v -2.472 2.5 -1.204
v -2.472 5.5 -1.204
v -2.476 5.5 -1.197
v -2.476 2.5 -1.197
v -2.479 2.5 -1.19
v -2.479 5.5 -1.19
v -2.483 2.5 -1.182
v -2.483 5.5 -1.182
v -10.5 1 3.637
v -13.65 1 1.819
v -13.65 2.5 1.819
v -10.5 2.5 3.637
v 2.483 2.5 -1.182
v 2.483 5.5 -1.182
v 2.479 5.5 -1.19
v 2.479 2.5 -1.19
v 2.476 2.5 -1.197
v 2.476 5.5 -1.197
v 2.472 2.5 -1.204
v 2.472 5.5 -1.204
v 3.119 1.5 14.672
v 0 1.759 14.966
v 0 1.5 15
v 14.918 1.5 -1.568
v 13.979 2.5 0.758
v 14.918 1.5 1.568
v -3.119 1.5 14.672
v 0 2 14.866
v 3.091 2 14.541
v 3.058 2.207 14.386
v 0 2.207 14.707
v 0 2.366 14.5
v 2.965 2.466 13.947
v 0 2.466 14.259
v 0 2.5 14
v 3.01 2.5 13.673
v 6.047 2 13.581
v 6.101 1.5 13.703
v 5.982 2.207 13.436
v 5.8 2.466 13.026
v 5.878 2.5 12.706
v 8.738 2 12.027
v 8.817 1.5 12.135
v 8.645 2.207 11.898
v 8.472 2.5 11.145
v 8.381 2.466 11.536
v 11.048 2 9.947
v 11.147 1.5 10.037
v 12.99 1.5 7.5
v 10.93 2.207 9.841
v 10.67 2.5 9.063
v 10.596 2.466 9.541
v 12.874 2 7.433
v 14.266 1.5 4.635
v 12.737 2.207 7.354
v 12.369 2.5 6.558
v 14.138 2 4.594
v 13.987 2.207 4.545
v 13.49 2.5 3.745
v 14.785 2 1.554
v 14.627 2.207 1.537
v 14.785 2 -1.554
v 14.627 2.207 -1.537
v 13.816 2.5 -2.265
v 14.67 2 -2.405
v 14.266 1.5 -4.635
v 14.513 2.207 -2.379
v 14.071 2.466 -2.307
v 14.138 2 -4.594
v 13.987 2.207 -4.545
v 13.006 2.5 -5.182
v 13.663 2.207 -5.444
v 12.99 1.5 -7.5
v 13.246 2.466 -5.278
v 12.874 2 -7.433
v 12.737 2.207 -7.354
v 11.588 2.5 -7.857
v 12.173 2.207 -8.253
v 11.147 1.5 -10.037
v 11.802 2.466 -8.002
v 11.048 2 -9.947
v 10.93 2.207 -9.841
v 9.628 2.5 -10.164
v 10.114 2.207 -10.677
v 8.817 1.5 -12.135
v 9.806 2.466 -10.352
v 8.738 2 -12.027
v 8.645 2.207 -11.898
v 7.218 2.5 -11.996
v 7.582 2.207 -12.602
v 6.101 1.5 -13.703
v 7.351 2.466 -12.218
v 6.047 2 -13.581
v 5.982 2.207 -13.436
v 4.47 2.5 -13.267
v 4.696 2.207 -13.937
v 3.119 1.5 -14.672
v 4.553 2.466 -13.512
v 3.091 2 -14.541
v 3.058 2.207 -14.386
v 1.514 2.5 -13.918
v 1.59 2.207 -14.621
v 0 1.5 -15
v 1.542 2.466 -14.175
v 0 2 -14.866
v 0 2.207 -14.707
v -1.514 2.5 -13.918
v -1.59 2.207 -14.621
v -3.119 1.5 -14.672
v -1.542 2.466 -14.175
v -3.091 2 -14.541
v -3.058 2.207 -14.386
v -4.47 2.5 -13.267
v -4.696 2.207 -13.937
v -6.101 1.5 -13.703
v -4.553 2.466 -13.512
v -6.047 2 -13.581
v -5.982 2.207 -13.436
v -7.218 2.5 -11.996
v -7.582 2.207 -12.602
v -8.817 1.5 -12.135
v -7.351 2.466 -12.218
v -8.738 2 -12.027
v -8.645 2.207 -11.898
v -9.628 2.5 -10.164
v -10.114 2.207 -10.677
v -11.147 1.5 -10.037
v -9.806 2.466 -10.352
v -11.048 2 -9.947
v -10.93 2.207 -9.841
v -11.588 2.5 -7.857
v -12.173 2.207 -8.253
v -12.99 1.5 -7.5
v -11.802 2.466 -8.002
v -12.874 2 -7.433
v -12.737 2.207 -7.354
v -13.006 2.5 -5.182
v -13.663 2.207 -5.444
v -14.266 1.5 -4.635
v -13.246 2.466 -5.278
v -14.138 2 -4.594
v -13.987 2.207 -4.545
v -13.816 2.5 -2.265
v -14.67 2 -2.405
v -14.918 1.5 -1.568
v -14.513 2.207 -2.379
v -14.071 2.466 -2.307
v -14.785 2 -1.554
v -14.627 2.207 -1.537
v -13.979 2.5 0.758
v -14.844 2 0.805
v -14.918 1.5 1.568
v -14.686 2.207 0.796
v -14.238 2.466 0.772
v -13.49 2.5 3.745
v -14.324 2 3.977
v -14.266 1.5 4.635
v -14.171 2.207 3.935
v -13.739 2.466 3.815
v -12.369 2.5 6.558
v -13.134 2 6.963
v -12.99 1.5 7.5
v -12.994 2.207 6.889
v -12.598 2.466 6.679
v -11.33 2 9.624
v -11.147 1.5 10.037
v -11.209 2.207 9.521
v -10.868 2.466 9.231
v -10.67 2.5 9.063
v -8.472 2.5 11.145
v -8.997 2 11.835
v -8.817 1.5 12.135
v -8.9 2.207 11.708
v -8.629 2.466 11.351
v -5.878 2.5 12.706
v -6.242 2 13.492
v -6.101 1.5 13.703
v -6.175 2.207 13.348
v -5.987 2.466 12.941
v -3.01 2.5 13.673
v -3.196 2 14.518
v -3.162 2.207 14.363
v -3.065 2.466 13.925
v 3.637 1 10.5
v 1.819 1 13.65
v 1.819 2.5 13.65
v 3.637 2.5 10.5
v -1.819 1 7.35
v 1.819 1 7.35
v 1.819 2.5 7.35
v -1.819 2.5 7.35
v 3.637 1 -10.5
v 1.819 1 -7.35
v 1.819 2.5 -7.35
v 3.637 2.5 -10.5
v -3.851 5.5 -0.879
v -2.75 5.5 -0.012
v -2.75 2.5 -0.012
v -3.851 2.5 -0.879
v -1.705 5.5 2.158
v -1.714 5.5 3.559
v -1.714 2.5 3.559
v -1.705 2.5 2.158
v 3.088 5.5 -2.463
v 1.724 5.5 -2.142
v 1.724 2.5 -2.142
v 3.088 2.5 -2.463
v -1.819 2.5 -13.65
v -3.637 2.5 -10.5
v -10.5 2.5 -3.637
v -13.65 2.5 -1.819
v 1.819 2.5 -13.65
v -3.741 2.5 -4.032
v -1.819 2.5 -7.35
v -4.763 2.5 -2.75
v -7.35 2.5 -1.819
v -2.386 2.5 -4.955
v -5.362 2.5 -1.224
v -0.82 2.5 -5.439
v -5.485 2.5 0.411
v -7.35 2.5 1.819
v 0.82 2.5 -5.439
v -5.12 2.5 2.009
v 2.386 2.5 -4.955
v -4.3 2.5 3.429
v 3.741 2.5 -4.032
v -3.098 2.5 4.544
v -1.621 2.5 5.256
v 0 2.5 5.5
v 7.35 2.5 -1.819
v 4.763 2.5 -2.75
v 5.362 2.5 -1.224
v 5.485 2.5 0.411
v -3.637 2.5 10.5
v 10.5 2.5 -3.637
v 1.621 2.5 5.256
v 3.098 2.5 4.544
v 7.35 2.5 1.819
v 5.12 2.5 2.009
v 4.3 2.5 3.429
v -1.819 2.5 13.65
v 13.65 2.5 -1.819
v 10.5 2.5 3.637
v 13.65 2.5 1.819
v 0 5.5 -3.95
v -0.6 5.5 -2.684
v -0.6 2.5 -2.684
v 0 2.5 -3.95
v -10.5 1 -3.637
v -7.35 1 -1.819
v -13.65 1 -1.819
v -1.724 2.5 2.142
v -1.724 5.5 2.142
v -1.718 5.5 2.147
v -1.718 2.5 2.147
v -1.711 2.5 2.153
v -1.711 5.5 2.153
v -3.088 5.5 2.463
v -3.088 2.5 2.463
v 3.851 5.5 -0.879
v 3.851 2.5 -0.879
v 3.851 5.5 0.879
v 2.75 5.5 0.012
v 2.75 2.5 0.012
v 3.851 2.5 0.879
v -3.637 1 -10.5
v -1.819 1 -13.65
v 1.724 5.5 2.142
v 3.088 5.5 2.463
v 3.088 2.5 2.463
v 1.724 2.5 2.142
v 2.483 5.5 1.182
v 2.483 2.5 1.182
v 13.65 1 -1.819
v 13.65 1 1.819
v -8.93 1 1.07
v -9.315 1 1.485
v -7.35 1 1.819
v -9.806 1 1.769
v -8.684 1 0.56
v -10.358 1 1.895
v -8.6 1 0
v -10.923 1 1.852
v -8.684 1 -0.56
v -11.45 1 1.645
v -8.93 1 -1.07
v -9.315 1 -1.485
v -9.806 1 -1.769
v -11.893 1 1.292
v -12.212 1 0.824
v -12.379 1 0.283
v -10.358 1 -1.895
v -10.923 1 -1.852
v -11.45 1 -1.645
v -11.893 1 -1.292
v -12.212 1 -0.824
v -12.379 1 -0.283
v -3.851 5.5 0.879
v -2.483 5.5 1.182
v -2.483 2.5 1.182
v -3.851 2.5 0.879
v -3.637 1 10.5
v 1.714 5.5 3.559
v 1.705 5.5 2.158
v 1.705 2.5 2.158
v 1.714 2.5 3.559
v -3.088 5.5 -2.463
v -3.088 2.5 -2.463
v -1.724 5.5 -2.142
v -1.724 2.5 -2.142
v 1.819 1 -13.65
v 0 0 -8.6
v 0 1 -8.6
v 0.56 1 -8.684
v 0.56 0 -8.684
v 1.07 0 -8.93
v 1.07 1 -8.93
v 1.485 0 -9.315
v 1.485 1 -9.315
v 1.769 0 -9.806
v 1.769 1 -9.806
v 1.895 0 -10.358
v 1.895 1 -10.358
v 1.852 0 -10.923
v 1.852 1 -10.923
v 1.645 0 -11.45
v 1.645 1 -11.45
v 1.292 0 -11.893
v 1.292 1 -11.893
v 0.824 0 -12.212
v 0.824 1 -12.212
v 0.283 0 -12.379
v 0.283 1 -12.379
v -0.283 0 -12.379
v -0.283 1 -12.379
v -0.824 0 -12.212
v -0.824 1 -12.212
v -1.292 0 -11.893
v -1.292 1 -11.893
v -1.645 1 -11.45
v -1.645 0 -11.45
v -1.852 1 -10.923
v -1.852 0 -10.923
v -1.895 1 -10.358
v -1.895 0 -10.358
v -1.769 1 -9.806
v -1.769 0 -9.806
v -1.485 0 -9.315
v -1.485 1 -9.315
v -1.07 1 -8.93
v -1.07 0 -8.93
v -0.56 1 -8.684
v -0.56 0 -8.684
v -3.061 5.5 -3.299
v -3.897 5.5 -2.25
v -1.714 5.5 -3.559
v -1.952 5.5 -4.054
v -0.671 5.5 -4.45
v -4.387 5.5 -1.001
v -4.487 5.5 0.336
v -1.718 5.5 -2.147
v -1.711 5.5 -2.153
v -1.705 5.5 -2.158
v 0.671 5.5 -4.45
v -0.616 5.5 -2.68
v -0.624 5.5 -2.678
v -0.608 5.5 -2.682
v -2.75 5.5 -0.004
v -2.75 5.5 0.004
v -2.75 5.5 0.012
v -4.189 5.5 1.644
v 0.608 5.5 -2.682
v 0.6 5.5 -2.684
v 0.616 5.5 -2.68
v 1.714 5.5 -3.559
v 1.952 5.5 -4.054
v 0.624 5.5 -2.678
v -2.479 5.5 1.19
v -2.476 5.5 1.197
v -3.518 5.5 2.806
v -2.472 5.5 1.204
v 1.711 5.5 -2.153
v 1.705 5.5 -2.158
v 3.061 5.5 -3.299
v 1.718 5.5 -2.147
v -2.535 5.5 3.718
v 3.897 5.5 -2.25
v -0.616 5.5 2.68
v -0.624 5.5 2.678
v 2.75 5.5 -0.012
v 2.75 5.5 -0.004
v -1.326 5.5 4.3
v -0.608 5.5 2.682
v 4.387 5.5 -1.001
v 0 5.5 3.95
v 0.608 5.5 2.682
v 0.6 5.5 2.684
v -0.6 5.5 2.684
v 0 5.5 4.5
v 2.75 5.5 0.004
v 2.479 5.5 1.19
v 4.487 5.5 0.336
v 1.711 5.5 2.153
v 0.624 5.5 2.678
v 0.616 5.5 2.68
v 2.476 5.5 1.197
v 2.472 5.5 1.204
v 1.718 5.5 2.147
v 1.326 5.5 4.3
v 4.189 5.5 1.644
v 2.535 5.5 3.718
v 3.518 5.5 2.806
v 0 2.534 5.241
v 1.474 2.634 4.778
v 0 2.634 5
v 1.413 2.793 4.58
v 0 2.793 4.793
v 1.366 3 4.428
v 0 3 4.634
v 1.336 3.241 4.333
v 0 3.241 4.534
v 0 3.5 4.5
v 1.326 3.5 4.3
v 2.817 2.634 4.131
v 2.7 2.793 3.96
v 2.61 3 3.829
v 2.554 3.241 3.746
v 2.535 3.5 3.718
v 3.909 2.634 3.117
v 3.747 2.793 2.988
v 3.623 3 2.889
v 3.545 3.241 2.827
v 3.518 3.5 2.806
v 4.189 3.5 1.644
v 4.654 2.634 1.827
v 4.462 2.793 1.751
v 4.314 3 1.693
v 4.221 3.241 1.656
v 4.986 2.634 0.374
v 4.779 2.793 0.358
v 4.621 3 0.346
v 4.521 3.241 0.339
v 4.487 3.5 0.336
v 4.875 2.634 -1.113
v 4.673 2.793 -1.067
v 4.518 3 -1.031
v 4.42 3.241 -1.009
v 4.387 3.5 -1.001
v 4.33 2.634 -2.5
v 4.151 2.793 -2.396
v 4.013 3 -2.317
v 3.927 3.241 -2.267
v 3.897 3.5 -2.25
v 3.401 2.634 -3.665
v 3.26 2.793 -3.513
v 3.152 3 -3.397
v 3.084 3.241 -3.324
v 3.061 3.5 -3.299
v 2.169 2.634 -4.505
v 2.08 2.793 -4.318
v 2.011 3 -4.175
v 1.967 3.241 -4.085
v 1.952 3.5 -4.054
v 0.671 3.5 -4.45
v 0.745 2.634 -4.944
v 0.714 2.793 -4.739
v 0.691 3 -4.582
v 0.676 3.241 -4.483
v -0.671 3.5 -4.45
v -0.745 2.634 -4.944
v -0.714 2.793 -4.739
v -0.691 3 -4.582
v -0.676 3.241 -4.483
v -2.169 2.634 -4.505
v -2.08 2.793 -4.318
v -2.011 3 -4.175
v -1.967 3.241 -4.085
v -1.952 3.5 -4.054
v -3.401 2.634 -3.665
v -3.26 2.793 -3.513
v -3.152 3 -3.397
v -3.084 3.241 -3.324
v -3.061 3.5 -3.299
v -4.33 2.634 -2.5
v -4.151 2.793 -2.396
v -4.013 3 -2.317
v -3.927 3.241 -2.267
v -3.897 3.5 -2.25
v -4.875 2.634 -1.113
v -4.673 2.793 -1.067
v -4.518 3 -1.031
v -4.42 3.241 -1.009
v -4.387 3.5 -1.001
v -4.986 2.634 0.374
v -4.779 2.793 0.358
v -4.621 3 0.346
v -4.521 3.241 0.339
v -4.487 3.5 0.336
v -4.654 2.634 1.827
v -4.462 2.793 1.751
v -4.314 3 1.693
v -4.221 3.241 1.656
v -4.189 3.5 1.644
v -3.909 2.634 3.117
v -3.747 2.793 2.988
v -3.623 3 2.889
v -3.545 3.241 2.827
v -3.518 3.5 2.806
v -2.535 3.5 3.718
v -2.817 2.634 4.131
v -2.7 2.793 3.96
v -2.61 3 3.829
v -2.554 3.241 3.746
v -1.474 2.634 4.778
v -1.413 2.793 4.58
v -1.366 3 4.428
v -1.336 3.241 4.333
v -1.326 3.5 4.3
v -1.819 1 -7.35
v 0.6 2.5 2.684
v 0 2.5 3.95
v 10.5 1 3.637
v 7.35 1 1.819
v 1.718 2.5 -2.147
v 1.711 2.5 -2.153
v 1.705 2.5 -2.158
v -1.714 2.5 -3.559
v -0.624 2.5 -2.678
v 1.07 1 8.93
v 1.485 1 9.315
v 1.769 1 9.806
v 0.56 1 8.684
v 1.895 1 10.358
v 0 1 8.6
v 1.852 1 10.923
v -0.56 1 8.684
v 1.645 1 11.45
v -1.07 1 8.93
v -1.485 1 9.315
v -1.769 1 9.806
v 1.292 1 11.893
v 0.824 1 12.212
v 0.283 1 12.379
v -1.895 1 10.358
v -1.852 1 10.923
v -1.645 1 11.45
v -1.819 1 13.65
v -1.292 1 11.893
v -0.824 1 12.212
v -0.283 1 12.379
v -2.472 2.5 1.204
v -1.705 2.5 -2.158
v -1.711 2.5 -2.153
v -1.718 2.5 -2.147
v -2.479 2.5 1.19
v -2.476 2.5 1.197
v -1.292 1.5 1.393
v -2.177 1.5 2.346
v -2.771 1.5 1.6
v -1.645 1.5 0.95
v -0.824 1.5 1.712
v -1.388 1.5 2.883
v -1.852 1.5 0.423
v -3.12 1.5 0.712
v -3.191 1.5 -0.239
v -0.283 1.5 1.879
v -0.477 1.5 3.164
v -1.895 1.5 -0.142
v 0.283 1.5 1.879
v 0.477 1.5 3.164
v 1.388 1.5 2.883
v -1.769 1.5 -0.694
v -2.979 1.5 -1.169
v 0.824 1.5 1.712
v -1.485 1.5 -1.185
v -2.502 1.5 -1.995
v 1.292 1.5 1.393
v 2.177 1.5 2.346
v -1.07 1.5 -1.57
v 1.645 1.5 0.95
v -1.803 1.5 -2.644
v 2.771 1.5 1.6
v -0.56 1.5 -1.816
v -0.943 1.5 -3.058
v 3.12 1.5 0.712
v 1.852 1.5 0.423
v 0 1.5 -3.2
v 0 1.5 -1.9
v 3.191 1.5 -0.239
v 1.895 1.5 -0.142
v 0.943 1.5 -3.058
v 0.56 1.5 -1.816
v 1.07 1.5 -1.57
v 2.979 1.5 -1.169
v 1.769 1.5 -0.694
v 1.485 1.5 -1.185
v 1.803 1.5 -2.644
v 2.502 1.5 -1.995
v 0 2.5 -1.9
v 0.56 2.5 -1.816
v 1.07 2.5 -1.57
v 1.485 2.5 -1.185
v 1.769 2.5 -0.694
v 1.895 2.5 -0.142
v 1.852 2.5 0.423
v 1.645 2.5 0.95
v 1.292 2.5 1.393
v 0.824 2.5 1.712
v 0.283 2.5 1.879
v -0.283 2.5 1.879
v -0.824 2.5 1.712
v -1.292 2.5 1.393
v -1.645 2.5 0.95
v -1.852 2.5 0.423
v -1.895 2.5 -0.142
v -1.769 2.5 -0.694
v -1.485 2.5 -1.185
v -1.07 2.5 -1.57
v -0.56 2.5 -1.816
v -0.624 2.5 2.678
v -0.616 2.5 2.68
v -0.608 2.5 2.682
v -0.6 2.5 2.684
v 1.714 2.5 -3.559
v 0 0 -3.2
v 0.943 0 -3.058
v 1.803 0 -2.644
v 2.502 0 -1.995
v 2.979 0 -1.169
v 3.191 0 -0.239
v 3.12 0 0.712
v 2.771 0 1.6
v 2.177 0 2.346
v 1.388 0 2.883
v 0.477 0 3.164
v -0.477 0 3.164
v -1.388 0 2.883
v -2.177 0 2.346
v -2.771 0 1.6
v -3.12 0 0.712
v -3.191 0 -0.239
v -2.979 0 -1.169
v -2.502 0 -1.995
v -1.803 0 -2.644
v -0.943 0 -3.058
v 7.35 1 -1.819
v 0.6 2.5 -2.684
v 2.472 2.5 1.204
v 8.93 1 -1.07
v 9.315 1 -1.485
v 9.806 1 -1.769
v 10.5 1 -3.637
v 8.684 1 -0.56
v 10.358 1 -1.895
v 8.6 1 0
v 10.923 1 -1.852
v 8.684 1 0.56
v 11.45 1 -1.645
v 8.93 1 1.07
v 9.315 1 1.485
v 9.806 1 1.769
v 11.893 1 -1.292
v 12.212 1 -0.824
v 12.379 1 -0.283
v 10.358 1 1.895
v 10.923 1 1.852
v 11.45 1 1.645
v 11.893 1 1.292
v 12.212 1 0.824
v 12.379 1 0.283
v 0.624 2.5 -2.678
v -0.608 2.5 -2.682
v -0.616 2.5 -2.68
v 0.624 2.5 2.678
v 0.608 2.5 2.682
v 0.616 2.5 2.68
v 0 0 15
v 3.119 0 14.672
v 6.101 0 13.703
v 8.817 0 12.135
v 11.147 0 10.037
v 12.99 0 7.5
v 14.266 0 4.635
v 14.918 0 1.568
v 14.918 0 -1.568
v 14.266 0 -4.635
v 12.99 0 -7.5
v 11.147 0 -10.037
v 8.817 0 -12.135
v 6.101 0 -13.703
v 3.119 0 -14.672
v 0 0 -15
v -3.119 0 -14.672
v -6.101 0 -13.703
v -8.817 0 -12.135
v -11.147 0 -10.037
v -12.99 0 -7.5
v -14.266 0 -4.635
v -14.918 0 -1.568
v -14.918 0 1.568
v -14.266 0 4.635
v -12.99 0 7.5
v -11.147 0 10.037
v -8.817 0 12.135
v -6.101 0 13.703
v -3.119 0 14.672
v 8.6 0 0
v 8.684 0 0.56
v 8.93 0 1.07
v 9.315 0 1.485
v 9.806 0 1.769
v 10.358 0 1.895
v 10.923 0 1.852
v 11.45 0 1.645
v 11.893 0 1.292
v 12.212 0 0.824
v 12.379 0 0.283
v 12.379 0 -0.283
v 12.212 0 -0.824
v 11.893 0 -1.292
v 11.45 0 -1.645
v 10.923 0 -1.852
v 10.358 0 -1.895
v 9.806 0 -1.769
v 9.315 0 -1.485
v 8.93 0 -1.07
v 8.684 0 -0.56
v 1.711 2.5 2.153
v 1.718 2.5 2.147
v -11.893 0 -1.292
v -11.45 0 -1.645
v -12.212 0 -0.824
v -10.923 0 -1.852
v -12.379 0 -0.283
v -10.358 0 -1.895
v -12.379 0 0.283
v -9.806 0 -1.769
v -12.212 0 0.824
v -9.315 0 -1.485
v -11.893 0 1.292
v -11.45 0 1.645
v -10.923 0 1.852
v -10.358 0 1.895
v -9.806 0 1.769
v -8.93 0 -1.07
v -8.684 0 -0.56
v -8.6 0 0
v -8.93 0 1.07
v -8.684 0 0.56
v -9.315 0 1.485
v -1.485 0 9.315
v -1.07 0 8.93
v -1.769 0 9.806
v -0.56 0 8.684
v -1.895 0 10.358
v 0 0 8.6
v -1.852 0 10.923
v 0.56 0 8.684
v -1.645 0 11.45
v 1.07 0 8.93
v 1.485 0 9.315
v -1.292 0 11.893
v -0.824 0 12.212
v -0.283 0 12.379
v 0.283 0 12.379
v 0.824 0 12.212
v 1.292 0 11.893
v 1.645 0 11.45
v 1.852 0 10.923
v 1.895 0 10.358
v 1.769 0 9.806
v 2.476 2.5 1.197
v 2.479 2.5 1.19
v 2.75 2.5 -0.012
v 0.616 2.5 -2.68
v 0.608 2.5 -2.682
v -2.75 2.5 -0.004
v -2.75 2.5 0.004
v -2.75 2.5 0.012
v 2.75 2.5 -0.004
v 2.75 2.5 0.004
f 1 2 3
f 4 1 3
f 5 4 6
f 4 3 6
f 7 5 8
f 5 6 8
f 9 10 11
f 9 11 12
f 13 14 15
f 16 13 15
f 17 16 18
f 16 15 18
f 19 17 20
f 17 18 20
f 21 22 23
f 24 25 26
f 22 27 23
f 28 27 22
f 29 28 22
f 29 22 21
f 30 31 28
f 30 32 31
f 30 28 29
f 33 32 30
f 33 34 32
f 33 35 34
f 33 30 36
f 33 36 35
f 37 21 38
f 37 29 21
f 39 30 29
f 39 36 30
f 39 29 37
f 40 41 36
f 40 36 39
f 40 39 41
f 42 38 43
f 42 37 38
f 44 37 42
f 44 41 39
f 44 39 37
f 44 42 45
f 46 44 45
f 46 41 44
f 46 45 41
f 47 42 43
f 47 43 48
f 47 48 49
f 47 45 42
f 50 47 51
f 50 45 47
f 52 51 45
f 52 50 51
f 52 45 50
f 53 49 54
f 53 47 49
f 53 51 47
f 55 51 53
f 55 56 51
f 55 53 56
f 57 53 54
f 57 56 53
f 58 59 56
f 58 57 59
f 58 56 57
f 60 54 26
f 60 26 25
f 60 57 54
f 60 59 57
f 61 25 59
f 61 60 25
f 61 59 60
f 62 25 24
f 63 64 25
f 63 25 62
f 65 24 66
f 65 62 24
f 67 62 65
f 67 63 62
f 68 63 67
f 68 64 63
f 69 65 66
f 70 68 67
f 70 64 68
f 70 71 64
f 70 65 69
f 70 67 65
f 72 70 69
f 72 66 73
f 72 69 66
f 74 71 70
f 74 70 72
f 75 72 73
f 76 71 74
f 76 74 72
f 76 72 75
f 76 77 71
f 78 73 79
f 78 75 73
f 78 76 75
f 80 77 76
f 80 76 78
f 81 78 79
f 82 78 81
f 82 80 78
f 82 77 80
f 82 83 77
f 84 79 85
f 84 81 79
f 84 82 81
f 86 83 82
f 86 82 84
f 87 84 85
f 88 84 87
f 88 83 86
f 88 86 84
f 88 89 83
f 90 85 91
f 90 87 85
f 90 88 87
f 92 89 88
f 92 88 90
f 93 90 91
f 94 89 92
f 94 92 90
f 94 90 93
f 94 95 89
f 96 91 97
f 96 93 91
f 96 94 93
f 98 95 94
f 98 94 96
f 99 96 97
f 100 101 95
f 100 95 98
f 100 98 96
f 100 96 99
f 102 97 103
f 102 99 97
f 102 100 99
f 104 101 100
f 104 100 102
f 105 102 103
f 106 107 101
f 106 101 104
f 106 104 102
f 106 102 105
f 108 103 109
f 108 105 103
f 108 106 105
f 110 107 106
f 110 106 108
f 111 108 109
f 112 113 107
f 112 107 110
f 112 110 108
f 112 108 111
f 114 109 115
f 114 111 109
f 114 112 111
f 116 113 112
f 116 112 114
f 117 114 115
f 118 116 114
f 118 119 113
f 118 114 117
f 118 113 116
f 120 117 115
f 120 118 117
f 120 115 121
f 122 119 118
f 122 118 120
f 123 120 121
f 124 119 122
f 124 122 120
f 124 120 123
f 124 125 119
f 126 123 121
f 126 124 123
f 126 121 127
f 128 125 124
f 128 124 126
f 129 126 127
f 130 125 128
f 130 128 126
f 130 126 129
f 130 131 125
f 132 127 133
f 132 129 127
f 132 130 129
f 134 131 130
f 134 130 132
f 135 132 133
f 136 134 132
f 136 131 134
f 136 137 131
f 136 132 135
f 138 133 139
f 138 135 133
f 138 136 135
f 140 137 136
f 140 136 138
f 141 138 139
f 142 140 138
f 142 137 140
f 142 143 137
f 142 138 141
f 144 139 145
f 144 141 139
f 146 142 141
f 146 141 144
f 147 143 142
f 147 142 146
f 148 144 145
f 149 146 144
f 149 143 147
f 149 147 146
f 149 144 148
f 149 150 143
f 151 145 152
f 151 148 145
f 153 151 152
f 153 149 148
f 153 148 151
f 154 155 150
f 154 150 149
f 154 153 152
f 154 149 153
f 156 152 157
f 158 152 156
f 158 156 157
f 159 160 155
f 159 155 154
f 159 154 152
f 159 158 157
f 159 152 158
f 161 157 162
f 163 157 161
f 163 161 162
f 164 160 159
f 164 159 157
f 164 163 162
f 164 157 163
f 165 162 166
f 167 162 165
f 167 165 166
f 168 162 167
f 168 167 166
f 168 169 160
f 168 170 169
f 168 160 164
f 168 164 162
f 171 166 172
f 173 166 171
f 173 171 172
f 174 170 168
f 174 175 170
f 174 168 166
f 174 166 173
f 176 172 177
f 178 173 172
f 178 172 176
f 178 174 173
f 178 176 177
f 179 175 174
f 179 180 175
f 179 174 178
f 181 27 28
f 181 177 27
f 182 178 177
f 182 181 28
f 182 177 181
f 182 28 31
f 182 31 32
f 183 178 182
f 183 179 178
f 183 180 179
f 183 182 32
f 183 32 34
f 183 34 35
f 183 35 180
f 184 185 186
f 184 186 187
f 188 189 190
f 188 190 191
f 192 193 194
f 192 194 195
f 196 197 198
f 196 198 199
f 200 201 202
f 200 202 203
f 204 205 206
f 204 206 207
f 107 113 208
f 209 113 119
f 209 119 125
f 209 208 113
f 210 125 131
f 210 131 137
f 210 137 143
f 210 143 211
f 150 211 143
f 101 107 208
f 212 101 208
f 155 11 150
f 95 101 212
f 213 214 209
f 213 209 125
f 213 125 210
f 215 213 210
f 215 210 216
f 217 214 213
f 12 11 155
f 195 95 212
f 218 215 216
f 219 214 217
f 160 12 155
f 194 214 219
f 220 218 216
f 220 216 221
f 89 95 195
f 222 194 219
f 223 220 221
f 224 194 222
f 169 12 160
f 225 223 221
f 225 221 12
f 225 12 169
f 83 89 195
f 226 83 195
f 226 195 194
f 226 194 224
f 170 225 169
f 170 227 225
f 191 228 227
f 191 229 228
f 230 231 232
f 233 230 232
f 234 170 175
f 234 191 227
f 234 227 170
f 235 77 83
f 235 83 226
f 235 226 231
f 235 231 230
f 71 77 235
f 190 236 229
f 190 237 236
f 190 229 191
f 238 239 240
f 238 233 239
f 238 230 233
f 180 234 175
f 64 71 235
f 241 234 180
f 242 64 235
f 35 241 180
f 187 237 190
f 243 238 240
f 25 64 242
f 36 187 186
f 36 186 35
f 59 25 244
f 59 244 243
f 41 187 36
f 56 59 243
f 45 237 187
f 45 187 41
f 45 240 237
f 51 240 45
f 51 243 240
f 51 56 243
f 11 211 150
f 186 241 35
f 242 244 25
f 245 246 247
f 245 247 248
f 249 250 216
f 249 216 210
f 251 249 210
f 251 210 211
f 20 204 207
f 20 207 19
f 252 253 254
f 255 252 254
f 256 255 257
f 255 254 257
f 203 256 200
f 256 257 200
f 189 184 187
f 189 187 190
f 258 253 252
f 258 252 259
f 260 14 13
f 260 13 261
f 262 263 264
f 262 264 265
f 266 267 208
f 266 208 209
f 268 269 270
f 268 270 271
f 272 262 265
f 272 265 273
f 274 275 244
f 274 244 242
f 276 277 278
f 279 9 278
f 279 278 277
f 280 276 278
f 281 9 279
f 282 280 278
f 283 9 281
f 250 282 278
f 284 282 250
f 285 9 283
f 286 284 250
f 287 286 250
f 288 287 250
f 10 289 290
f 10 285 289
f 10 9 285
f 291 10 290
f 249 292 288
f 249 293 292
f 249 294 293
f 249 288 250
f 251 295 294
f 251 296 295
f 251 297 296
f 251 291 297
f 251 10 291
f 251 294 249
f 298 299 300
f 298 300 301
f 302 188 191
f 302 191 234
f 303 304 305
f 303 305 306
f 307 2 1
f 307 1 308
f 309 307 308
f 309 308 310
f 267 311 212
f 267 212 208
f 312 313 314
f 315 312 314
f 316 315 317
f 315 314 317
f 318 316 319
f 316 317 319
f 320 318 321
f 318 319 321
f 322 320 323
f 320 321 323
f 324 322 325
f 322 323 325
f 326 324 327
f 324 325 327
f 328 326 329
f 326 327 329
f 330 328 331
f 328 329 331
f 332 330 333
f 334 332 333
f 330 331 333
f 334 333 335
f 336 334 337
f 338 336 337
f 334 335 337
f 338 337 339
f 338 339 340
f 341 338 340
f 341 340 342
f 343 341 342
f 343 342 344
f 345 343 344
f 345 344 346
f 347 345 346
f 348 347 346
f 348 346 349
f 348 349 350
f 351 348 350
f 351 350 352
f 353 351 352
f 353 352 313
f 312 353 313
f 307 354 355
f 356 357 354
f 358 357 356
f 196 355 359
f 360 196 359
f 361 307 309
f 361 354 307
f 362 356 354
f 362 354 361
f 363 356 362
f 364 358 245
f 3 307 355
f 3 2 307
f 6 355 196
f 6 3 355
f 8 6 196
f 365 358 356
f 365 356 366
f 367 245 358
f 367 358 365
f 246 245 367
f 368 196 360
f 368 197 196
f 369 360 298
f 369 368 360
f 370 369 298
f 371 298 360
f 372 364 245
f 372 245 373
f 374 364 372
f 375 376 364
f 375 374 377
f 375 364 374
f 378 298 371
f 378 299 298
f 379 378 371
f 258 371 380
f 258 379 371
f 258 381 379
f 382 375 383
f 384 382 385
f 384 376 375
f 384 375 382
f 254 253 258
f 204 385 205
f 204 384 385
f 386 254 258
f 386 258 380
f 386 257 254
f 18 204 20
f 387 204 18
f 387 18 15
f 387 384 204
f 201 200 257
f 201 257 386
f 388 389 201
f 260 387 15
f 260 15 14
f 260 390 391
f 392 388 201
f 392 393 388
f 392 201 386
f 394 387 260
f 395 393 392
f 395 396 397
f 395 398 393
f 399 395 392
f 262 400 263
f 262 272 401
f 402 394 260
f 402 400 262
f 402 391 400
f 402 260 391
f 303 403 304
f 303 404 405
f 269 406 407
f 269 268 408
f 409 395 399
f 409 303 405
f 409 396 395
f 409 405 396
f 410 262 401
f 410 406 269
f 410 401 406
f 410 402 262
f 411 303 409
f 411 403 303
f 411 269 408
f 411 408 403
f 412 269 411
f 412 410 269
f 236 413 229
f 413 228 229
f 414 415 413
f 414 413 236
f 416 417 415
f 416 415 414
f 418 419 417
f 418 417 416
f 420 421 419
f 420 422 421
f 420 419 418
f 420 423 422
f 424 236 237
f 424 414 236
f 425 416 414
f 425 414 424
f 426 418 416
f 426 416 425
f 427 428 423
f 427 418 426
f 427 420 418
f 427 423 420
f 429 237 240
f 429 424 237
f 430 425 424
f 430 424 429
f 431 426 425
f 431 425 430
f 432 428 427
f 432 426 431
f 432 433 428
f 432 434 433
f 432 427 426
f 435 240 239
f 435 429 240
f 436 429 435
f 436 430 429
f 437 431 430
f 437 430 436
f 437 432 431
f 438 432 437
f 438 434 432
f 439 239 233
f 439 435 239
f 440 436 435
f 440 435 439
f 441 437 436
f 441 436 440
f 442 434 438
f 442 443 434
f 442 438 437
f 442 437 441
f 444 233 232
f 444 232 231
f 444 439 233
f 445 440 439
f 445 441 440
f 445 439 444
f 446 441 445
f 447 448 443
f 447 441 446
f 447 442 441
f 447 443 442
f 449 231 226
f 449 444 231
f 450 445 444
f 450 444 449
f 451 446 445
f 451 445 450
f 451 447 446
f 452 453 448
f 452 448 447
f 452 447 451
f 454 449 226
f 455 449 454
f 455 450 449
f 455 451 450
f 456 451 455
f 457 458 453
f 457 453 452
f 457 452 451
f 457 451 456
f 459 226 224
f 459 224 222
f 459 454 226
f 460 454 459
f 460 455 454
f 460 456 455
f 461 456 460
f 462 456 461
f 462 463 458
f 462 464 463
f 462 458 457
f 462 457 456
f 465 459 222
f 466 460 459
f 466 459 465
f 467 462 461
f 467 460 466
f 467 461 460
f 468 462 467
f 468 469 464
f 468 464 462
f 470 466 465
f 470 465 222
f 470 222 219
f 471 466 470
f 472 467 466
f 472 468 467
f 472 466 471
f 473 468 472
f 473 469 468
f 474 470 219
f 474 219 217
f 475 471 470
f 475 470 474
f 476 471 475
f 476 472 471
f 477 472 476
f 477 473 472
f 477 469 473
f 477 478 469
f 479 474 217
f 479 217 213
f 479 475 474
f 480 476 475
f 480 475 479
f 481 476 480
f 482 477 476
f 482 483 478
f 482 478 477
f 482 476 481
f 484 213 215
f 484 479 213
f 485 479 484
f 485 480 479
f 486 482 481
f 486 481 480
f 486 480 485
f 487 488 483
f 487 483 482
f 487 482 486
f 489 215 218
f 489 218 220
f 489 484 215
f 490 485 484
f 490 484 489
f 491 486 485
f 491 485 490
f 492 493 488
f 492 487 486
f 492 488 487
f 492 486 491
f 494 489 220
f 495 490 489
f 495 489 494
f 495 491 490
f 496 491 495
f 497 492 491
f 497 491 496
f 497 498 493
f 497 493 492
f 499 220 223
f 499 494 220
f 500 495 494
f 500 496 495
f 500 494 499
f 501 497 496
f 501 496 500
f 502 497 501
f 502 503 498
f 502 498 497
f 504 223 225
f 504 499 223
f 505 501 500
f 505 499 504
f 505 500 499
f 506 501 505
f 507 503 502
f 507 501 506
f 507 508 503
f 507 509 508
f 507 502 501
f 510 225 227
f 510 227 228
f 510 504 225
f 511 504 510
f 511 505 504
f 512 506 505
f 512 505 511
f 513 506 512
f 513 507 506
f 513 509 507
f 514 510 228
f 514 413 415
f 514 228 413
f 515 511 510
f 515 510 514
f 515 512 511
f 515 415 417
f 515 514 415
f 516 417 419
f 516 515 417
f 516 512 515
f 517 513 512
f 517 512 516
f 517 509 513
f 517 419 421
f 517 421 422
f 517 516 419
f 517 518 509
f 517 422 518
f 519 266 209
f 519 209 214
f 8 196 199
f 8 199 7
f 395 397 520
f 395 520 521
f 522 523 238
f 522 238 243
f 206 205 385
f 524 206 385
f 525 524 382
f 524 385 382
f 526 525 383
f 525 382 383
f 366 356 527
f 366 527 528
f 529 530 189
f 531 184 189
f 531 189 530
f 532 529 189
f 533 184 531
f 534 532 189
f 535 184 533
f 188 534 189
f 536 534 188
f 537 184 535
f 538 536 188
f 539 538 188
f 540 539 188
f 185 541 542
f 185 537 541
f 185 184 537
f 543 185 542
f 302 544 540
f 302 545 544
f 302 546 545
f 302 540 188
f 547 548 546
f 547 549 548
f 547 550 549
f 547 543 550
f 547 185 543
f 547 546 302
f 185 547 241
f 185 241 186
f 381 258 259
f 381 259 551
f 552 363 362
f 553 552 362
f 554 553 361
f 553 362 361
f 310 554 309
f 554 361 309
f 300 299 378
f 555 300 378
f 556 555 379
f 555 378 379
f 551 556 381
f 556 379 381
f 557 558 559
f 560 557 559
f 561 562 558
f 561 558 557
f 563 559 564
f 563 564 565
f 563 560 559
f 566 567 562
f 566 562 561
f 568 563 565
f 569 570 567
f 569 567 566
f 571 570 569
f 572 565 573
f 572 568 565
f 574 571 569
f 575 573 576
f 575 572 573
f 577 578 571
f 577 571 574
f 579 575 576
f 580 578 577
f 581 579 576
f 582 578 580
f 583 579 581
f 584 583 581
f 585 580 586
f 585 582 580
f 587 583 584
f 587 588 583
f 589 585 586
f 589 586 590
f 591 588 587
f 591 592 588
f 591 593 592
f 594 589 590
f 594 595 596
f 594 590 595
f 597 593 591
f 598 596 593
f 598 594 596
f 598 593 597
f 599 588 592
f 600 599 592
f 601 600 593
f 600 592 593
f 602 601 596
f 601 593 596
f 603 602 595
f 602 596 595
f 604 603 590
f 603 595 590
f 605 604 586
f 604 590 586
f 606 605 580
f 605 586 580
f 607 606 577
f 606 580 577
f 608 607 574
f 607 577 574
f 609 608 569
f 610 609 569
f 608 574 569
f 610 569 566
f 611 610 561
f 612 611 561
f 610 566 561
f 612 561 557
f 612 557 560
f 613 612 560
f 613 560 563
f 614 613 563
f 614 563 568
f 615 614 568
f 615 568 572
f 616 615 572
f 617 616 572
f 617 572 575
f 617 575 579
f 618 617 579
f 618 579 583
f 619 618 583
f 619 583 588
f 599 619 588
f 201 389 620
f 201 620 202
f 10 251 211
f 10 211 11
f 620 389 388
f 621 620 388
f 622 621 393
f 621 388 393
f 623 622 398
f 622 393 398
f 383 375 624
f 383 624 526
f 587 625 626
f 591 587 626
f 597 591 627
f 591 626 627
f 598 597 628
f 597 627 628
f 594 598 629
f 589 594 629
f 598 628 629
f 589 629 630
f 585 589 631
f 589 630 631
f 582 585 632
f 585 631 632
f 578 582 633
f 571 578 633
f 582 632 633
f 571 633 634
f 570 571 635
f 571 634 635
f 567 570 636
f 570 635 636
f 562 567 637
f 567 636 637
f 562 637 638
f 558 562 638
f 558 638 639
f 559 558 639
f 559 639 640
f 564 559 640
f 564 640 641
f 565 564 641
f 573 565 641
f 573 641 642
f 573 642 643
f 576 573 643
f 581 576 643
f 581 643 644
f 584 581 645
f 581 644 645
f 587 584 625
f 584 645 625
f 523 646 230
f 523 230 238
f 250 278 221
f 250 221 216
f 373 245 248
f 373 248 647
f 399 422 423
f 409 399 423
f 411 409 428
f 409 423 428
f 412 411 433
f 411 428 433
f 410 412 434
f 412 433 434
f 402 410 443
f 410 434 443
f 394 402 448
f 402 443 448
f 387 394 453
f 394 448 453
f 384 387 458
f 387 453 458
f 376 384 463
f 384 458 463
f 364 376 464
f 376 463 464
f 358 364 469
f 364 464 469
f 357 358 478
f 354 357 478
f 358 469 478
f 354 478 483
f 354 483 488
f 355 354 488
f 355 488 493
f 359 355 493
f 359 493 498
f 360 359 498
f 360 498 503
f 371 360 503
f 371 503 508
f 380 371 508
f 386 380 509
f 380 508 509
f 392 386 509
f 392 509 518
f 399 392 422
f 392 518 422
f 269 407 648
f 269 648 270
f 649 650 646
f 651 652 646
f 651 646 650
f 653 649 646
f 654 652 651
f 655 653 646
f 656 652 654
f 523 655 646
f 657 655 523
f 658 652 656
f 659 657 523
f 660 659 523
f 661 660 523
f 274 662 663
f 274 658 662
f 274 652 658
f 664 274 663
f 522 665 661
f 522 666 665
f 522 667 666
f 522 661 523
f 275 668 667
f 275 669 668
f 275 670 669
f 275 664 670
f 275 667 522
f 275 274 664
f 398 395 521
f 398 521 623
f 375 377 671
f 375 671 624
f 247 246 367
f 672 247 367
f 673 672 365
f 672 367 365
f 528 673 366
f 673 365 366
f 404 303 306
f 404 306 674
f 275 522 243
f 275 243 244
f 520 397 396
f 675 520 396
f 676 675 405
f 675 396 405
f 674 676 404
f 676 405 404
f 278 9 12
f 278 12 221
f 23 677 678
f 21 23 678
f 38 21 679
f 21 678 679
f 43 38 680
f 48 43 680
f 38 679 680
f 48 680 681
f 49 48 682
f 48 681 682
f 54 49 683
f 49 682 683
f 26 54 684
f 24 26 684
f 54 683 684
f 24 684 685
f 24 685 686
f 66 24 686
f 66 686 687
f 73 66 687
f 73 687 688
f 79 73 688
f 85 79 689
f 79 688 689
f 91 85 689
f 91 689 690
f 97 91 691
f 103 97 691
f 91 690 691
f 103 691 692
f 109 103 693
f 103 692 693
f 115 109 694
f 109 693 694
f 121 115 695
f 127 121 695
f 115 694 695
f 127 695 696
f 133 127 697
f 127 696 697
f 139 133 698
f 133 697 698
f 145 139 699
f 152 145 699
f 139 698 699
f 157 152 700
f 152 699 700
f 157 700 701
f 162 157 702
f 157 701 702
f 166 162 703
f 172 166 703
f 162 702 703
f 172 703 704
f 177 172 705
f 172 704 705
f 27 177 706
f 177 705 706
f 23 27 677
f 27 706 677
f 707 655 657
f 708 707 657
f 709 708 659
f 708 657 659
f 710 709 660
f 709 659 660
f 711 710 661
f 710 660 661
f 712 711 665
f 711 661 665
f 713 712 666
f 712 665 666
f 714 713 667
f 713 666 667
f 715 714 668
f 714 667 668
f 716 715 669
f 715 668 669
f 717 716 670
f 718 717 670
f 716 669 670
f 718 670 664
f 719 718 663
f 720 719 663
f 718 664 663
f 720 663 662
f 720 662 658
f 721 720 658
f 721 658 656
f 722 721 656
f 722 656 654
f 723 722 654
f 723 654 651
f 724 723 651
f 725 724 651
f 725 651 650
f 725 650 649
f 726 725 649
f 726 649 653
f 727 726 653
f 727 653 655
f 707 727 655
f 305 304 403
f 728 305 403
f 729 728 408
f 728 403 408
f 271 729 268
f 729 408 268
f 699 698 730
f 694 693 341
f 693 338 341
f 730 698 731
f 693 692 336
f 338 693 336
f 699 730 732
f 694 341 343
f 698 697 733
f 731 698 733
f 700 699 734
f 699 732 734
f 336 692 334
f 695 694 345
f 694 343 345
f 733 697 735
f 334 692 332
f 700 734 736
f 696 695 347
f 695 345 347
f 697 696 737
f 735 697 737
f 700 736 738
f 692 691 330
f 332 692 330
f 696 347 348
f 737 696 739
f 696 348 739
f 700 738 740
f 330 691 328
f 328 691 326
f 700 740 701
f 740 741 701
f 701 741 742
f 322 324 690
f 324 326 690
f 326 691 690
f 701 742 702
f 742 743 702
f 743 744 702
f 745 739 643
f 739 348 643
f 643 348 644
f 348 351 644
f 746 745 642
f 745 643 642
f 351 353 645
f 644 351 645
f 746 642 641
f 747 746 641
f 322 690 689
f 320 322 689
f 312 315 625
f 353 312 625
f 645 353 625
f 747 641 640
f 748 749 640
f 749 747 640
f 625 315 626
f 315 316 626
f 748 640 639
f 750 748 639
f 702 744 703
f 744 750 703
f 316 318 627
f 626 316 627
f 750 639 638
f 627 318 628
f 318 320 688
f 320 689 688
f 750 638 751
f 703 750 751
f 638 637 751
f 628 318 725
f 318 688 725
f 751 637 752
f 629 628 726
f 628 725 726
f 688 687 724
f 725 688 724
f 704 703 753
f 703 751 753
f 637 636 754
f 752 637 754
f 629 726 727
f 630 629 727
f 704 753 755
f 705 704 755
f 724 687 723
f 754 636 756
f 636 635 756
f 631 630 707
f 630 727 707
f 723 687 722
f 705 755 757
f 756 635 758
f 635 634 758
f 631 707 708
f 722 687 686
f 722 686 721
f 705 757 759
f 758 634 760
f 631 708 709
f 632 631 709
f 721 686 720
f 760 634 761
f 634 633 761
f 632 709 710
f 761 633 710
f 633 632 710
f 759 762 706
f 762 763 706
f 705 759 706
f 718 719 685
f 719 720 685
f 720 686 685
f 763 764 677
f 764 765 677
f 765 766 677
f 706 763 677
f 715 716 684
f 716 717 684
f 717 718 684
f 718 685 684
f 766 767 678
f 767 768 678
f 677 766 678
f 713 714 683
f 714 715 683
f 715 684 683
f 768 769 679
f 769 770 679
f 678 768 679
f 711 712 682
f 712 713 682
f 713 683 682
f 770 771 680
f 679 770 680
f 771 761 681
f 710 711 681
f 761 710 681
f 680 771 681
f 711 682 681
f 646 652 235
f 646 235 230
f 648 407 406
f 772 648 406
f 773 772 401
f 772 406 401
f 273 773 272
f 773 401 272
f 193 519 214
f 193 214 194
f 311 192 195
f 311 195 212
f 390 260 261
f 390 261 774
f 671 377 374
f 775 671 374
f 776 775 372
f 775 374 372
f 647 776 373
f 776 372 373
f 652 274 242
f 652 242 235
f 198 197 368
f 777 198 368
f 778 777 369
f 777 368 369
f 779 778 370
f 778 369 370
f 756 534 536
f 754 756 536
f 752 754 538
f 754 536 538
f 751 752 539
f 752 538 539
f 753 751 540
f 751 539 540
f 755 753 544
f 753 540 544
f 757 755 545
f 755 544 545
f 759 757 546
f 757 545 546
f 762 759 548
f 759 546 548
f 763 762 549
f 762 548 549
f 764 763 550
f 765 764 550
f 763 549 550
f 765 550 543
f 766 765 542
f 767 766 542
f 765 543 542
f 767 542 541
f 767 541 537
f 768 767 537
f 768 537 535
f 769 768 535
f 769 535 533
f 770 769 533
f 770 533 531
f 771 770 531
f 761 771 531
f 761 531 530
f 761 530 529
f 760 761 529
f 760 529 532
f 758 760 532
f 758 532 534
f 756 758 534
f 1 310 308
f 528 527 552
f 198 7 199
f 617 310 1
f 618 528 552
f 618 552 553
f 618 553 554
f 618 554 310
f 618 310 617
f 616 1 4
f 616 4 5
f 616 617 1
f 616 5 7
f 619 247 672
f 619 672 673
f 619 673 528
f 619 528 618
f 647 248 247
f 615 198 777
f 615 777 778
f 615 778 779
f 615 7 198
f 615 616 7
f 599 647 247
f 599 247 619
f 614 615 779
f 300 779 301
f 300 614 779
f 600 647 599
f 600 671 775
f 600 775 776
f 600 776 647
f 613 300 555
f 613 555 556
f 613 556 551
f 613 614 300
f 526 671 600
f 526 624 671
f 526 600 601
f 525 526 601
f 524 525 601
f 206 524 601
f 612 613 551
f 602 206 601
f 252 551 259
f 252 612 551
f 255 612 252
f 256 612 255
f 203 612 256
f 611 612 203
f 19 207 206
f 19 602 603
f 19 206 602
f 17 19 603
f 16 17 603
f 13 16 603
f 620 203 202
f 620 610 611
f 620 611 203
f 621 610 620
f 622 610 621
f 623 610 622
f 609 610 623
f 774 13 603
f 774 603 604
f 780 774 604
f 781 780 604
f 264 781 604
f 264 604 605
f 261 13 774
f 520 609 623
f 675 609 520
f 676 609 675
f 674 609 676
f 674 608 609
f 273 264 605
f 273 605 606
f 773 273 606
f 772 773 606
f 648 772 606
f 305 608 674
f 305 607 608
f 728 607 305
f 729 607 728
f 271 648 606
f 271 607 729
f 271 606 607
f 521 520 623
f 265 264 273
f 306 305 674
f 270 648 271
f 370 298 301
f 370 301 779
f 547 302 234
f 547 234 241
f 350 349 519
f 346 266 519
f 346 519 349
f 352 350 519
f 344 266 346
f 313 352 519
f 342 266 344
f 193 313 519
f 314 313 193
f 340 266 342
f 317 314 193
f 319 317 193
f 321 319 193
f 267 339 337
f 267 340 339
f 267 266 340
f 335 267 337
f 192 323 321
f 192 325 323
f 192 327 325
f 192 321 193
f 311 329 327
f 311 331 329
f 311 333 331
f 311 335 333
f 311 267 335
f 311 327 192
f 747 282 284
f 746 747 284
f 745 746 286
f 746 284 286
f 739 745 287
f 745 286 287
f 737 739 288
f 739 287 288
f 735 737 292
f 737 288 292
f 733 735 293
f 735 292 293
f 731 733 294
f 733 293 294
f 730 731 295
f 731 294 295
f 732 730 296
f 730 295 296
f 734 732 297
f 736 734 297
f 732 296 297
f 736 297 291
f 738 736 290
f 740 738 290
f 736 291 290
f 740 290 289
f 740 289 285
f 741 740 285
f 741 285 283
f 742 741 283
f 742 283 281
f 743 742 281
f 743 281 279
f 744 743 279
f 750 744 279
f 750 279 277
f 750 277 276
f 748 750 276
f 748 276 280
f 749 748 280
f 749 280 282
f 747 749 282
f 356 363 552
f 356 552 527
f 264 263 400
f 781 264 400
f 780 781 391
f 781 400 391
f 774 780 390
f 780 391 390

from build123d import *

# Parameters (mm, degrees)
CROQUIS1_R              = 15
SALIENTE_EXTRUIR1_DEPTH = 2.5
CROQUIS2_R              = 4.5
SALIENTE_EXTRUIR2_DEPTH = 3
CROQUIS3_R              = 2.75
CORTAR_EXTRUIR1_DEPTH   = 3
CORTAR_EXTRUIR2_REACH   = 23.915
CROQUIS4_R              = 1.9
CORTAR_EXTRUIR4_REACH   = 23.424
CROQUIS6_R              = 1.9
CORTAR_EXTRUIR3_START   = -1.5
CORTAR_EXTRUIR3_DEPTH   = 2.5
MATRIZC1_COUNT          = 4
CORTAR_EXTRUIR5_DEPTH   = 3
MATRIZC2_COUNT          = 14
REDONDEO1_R             = 1
CROQUIS9_R              = 3.2
CORTAR_EXTRUIR6_DEPTH   = 1.5


with BuildPart() as part:
    # Croquis1 → Saliente-Extruir1 (new body)
    with BuildSketch(Plane(origin=(0, 0, 0), x_dir=(1, 0, 0), z_dir=(0, 1, 0))):
        with Locations(Location((0, 0, 0), (0, 0, 270))):
            Circle(CROQUIS1_R)
    extrude(amount=SALIENTE_EXTRUIR1_DEPTH)

    # Croquis2 → Saliente-Extruir2 (add)
    with BuildSketch(Plane(origin=(0, 2.5, 0), x_dir=(1, 0, 0), z_dir=(0, 1, 0))):
        with Locations(Location((0, 0, 0), (0, 0, 270))):
            Circle(CROQUIS2_R)
    extrude(amount=SALIENTE_EXTRUIR2_DEPTH)

    # Croquis3 → Cortar-Extruir1 (cut)
    with BuildSketch(Plane(origin=(0, 5.5, 0), x_dir=(1, 0, 0), z_dir=(0, 1, 0))):
        with Locations(Location((0, 0, 0), (0, 0, 270))):
            Circle(CROQUIS3_R)
    extrude(amount=-CORTAR_EXTRUIR1_DEPTH, mode=Mode.SUBTRACT)

    # Croquis4 → Cortar-Extruir2 (cut, up to next)
    with BuildSketch(Plane.XZ, mode=Mode.PRIVATE) as cortar_extruir2_sk1:
        with Locations(Location((0, 0, 0), (0, 0, 270))):
            Circle(CROQUIS4_R)
    cortar_extruir2_tool1 = extrude(cortar_extruir2_sk1.sketch, amount=-CORTAR_EXTRUIR2_REACH, mode=Mode.PRIVATE) & part.part
    add(cortar_extruir2_tool1.solids().sort_by_distance((0, 0, 0))[0], mode=Mode.SUBTRACT)

    # Croquis6 → Cortar-Extruir4 (cut, up to next)
    with BuildSketch(Plane(origin=(0, 2.5, 0), x_dir=(1, 0, 0), z_dir=(0, 1, 0)), mode=Mode.PRIVATE) as cortar_extruir4_sk1:
        with Locations(Location((0, 10.5, 0), (0, 0, 270))):
            Circle(CROQUIS6_R)
    cortar_extruir4_tool1 = extrude(cortar_extruir4_sk1.sketch, amount=-CORTAR_EXTRUIR4_REACH, mode=Mode.PRIVATE) & part.part
    cortar_extruir4 = cortar_extruir4_tool1.solids().sort_by_distance((0, 2.5, -10.5))[0]
    add(cortar_extruir4, mode=Mode.SUBTRACT)

    # Croquis5 → Cortar-Extruir3 (cut)
    with BuildSketch(Plane(origin=(0, 2.5, 0), x_dir=(1, 0, 0), z_dir=(0, 1, 0)).offset(CORTAR_EXTRUIR3_START)):
        Polygon((-1.818653348, 13.65), (-3.637306696, 10.5), (-1.818653348, 7.35), (1.818653348, 7.35), (3.637306696, 10.5), (1.818653348, 13.65), align=None)
    cortar_extruir3 = extrude(amount=CORTAR_EXTRUIR3_DEPTH, mode=Mode.SUBTRACT)

    # MatrizC1: Cortar-Extruir4, Cortar-Extruir3 ×4 about axis
    matrizc1_axis = Axis((0, 0, 0), (0, 1, 0))
    add([cortar_extruir4.rotate(matrizc1_axis, i * 360 / MATRIZC1_COUNT) for i in range(1, MATRIZC1_COUNT)], mode=Mode.SUBTRACT)
    add([cortar_extruir3.rotate(matrizc1_axis, i * 360 / MATRIZC1_COUNT) for i in range(1, MATRIZC1_COUNT)], mode=Mode.SUBTRACT)

    # Croquis7 → Cortar-Extruir5 (cut)
    with BuildSketch(Plane(origin=(0, 5.5, 0), x_dir=(1, 0, 0), z_dir=(0, 1, 0))):
        with BuildLine():
            Line((0, 3.95), (0.6, 2.68374738))
            ThreePointArc((0.6, 2.68374738), (0, 2.75), (-0.6, 2.68374738))
            Line((-0.6, 2.68374738), (0, 3.95))
        make_face()
    cortar_extruir5 = extrude(amount=-CORTAR_EXTRUIR5_DEPTH, mode=Mode.SUBTRACT)

    # MatrizC2: Cortar-Extruir5 ×14 about axis
    matrizc2_axis = Axis((0, 0, 0), (0, 1, 0))
    for i in range(1, MATRIZC2_COUNT):
        add(cortar_extruir5.rotate(matrizc2_axis, i * 360 / MATRIZC2_COUNT), mode=Mode.SUBTRACT)

    # Redondeo1
    redondeo1_edges = [part.edges().sort_by_distance(p)[0] for p in [
        (0, 2.5, -15),
        (0, 2.5, -4.5),
    ]]
    fillet(redondeo1_edges, radius=REDONDEO1_R)

    # Croquis9 → Cortar-Extruir6 (cut)
    with BuildSketch(Plane.XZ):
        with Locations(Location((0, 0, 0), (0, 0, 270))):
            Circle(CROQUIS9_R)
    extrude(amount=-CORTAR_EXTRUIR6_DEPTH, mode=Mode.SUBTRACT)


solid = part.part
